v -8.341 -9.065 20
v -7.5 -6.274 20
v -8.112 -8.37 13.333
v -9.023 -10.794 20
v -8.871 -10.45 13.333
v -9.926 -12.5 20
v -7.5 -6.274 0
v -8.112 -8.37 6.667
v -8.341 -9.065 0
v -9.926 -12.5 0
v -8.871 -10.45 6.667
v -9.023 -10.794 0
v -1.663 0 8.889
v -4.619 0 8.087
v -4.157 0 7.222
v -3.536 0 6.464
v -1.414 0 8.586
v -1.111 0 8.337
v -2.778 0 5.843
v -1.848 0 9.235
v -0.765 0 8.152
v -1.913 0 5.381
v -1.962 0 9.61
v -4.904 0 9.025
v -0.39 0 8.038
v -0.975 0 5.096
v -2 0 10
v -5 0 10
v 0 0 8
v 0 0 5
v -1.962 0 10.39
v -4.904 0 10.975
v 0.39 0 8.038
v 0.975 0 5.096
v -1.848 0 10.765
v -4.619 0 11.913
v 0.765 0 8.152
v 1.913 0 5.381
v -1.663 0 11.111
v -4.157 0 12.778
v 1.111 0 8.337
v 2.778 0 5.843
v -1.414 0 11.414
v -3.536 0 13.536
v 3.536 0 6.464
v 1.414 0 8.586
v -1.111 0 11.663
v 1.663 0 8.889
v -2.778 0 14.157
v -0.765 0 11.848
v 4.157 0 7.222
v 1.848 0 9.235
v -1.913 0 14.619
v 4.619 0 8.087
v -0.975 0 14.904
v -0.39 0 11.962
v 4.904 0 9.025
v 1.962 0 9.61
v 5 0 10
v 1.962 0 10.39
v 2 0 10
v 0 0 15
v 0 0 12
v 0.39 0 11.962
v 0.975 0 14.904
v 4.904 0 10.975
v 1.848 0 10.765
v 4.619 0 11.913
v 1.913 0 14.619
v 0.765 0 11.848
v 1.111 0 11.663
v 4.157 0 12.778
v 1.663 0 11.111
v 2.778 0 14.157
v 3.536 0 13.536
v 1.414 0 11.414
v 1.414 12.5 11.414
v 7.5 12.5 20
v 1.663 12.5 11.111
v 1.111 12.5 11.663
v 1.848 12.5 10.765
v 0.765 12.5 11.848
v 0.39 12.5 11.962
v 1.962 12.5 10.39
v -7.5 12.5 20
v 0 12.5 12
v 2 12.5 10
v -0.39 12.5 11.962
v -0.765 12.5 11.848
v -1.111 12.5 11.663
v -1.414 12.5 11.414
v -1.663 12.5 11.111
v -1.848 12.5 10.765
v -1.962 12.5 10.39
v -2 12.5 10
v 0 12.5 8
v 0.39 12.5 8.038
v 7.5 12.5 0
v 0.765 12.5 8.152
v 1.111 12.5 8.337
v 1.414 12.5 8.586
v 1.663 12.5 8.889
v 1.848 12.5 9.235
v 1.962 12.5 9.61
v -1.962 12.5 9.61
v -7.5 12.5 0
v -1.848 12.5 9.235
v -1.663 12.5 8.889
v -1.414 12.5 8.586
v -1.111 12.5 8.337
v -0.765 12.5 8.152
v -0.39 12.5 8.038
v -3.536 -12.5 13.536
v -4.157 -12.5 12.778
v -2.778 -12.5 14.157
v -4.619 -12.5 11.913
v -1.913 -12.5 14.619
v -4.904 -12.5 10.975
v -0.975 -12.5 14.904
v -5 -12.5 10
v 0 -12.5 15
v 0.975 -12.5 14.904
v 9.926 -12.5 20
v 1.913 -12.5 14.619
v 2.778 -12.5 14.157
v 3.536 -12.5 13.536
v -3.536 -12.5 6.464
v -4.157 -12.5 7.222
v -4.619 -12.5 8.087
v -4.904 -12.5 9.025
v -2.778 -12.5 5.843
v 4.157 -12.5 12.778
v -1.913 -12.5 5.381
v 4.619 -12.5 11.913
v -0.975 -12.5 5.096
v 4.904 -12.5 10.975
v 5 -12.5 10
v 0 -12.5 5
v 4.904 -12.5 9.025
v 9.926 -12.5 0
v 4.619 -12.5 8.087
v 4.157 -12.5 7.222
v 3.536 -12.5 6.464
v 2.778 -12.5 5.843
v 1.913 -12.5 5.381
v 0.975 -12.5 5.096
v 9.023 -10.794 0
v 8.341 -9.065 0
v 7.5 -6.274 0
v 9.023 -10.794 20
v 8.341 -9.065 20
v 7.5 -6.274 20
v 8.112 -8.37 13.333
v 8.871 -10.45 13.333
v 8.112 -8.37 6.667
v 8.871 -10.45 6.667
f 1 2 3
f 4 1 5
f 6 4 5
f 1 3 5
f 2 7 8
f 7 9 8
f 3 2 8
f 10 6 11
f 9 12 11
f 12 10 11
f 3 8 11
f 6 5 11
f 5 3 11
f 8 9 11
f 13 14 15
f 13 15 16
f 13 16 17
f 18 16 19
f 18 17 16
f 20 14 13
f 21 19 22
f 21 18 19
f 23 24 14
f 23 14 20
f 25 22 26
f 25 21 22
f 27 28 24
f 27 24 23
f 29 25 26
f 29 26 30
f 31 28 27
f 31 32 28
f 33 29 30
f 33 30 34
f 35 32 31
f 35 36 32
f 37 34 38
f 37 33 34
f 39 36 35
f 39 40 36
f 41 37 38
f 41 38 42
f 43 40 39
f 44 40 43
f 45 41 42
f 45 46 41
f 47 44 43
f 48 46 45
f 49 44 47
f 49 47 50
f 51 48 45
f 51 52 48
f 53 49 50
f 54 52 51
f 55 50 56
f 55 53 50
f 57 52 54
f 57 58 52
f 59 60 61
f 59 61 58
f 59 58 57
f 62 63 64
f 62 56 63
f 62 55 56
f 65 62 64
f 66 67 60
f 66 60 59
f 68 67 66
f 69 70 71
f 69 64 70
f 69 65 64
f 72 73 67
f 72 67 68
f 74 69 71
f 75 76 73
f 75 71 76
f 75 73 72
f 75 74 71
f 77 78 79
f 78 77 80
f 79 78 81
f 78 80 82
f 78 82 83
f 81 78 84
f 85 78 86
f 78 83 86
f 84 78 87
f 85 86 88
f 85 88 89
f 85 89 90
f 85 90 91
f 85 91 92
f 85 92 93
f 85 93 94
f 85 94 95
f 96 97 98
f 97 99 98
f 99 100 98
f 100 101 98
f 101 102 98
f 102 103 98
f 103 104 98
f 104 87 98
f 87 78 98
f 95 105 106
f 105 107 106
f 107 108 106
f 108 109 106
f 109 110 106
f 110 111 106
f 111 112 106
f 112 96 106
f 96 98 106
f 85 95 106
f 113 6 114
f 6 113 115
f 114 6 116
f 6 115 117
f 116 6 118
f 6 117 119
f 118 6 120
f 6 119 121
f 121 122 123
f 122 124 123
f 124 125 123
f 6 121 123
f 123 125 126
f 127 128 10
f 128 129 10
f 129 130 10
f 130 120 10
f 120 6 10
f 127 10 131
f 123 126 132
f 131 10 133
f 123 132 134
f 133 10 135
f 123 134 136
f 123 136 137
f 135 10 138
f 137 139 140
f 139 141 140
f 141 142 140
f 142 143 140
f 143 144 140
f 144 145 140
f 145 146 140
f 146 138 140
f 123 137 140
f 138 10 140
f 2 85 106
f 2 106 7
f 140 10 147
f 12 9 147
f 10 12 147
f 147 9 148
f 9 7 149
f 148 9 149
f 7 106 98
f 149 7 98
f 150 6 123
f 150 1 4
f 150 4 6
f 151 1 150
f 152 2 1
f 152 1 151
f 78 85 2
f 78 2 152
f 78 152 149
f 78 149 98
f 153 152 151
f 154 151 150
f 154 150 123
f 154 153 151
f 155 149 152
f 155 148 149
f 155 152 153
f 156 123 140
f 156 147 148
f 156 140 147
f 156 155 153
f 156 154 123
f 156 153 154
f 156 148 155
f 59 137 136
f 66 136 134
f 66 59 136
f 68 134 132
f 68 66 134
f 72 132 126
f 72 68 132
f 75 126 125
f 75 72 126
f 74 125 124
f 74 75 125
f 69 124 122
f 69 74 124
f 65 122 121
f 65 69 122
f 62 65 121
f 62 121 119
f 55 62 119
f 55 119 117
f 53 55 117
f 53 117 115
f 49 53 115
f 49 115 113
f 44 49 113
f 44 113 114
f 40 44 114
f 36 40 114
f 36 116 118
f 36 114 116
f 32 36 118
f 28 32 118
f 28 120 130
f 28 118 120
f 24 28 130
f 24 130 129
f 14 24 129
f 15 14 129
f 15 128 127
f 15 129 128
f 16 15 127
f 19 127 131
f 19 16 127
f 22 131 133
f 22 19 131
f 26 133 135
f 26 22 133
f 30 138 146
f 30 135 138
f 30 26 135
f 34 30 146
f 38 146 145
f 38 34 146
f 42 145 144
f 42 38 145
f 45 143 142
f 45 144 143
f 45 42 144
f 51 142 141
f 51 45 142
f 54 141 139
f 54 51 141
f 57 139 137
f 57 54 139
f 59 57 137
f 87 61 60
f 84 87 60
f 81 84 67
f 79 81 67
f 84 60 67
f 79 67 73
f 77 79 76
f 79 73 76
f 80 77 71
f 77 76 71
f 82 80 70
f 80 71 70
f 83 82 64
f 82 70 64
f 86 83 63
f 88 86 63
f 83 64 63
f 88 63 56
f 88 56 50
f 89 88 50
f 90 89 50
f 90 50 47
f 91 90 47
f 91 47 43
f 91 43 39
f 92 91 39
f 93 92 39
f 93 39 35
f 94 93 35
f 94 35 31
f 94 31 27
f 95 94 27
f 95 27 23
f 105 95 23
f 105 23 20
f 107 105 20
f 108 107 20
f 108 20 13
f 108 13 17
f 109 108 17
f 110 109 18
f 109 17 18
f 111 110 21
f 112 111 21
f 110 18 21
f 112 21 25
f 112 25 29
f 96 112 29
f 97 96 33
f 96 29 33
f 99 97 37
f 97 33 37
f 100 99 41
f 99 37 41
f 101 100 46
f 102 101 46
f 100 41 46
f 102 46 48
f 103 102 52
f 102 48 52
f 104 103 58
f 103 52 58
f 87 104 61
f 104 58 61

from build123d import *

# Parameters (mm, degrees)
F1_DEPTH = 20
F2_R     = 5
F2_R_2   = 2
F3_DEPTH = 25
F4_DEPTH = 25


with BuildPart() as f1:
    # F0 (on Top) → F1 (new body)
    with BuildSketch(Plane.XY):
        with BuildLine():
            Line((-9.9256848916, -12.5), (-7.5, -12.5))
            Line((-7.5, -12.5), (7.5, -12.5))
            Line((7.5, -12.5), (9.9256848916, -12.5))
            add(Edge.make_bspline(
                [(7.5, -6.2737814151), (8.087411693, -8.3720675571), (8.674823386, -10.4703536991), (9.9256848916, -12.5)],
                knots=[0, 0, 0, 0, 0.4559339128, 0.4559339128, 0.4559339128, 0.4559339128], degree=3))
            Line((7.5, -6.2737814151), (7.5, 12.5))
            Line((7.5, 12.5), (-7.5, 12.5))
            Line((-7.5, 12.5), (-7.5, -6.2737814151))
            add(Edge.make_bspline(
                [(-7.5, -6.2737814151), (-8.087411693, -8.3720675571), (-8.674823386, -10.4703536991), (-9.9256848916, -12.5)],
                knots=[0, 0, 0, 0, 0.4559339128, 0.4559339128, 0.4559339128, 0.4559339128], degree=3))
        make_face()
    extrude(amount=F1_DEPTH)

    # F2 (on Front) → F3 (cut)
    with BuildSketch(Plane.XZ):
        with Locations((0, 10)):
            Circle(F2_R)
        with Locations((0, 10)):
            Circle(F2_R_2, mode=Mode.SUBTRACT)
        with Locations((0, 10)):
            Circle(F2_R_2)
    extrude(amount=F3_DEPTH, mode=Mode.SUBTRACT)

    # F2 (on Front) → F4 (cut)
    with BuildSketch(Plane.XZ):
        with Locations((0, 10)):
            Circle(F2_R_2)
    extrude(amount=-F4_DEPTH, mode=Mode.SUBTRACT)


solid = f1.part
